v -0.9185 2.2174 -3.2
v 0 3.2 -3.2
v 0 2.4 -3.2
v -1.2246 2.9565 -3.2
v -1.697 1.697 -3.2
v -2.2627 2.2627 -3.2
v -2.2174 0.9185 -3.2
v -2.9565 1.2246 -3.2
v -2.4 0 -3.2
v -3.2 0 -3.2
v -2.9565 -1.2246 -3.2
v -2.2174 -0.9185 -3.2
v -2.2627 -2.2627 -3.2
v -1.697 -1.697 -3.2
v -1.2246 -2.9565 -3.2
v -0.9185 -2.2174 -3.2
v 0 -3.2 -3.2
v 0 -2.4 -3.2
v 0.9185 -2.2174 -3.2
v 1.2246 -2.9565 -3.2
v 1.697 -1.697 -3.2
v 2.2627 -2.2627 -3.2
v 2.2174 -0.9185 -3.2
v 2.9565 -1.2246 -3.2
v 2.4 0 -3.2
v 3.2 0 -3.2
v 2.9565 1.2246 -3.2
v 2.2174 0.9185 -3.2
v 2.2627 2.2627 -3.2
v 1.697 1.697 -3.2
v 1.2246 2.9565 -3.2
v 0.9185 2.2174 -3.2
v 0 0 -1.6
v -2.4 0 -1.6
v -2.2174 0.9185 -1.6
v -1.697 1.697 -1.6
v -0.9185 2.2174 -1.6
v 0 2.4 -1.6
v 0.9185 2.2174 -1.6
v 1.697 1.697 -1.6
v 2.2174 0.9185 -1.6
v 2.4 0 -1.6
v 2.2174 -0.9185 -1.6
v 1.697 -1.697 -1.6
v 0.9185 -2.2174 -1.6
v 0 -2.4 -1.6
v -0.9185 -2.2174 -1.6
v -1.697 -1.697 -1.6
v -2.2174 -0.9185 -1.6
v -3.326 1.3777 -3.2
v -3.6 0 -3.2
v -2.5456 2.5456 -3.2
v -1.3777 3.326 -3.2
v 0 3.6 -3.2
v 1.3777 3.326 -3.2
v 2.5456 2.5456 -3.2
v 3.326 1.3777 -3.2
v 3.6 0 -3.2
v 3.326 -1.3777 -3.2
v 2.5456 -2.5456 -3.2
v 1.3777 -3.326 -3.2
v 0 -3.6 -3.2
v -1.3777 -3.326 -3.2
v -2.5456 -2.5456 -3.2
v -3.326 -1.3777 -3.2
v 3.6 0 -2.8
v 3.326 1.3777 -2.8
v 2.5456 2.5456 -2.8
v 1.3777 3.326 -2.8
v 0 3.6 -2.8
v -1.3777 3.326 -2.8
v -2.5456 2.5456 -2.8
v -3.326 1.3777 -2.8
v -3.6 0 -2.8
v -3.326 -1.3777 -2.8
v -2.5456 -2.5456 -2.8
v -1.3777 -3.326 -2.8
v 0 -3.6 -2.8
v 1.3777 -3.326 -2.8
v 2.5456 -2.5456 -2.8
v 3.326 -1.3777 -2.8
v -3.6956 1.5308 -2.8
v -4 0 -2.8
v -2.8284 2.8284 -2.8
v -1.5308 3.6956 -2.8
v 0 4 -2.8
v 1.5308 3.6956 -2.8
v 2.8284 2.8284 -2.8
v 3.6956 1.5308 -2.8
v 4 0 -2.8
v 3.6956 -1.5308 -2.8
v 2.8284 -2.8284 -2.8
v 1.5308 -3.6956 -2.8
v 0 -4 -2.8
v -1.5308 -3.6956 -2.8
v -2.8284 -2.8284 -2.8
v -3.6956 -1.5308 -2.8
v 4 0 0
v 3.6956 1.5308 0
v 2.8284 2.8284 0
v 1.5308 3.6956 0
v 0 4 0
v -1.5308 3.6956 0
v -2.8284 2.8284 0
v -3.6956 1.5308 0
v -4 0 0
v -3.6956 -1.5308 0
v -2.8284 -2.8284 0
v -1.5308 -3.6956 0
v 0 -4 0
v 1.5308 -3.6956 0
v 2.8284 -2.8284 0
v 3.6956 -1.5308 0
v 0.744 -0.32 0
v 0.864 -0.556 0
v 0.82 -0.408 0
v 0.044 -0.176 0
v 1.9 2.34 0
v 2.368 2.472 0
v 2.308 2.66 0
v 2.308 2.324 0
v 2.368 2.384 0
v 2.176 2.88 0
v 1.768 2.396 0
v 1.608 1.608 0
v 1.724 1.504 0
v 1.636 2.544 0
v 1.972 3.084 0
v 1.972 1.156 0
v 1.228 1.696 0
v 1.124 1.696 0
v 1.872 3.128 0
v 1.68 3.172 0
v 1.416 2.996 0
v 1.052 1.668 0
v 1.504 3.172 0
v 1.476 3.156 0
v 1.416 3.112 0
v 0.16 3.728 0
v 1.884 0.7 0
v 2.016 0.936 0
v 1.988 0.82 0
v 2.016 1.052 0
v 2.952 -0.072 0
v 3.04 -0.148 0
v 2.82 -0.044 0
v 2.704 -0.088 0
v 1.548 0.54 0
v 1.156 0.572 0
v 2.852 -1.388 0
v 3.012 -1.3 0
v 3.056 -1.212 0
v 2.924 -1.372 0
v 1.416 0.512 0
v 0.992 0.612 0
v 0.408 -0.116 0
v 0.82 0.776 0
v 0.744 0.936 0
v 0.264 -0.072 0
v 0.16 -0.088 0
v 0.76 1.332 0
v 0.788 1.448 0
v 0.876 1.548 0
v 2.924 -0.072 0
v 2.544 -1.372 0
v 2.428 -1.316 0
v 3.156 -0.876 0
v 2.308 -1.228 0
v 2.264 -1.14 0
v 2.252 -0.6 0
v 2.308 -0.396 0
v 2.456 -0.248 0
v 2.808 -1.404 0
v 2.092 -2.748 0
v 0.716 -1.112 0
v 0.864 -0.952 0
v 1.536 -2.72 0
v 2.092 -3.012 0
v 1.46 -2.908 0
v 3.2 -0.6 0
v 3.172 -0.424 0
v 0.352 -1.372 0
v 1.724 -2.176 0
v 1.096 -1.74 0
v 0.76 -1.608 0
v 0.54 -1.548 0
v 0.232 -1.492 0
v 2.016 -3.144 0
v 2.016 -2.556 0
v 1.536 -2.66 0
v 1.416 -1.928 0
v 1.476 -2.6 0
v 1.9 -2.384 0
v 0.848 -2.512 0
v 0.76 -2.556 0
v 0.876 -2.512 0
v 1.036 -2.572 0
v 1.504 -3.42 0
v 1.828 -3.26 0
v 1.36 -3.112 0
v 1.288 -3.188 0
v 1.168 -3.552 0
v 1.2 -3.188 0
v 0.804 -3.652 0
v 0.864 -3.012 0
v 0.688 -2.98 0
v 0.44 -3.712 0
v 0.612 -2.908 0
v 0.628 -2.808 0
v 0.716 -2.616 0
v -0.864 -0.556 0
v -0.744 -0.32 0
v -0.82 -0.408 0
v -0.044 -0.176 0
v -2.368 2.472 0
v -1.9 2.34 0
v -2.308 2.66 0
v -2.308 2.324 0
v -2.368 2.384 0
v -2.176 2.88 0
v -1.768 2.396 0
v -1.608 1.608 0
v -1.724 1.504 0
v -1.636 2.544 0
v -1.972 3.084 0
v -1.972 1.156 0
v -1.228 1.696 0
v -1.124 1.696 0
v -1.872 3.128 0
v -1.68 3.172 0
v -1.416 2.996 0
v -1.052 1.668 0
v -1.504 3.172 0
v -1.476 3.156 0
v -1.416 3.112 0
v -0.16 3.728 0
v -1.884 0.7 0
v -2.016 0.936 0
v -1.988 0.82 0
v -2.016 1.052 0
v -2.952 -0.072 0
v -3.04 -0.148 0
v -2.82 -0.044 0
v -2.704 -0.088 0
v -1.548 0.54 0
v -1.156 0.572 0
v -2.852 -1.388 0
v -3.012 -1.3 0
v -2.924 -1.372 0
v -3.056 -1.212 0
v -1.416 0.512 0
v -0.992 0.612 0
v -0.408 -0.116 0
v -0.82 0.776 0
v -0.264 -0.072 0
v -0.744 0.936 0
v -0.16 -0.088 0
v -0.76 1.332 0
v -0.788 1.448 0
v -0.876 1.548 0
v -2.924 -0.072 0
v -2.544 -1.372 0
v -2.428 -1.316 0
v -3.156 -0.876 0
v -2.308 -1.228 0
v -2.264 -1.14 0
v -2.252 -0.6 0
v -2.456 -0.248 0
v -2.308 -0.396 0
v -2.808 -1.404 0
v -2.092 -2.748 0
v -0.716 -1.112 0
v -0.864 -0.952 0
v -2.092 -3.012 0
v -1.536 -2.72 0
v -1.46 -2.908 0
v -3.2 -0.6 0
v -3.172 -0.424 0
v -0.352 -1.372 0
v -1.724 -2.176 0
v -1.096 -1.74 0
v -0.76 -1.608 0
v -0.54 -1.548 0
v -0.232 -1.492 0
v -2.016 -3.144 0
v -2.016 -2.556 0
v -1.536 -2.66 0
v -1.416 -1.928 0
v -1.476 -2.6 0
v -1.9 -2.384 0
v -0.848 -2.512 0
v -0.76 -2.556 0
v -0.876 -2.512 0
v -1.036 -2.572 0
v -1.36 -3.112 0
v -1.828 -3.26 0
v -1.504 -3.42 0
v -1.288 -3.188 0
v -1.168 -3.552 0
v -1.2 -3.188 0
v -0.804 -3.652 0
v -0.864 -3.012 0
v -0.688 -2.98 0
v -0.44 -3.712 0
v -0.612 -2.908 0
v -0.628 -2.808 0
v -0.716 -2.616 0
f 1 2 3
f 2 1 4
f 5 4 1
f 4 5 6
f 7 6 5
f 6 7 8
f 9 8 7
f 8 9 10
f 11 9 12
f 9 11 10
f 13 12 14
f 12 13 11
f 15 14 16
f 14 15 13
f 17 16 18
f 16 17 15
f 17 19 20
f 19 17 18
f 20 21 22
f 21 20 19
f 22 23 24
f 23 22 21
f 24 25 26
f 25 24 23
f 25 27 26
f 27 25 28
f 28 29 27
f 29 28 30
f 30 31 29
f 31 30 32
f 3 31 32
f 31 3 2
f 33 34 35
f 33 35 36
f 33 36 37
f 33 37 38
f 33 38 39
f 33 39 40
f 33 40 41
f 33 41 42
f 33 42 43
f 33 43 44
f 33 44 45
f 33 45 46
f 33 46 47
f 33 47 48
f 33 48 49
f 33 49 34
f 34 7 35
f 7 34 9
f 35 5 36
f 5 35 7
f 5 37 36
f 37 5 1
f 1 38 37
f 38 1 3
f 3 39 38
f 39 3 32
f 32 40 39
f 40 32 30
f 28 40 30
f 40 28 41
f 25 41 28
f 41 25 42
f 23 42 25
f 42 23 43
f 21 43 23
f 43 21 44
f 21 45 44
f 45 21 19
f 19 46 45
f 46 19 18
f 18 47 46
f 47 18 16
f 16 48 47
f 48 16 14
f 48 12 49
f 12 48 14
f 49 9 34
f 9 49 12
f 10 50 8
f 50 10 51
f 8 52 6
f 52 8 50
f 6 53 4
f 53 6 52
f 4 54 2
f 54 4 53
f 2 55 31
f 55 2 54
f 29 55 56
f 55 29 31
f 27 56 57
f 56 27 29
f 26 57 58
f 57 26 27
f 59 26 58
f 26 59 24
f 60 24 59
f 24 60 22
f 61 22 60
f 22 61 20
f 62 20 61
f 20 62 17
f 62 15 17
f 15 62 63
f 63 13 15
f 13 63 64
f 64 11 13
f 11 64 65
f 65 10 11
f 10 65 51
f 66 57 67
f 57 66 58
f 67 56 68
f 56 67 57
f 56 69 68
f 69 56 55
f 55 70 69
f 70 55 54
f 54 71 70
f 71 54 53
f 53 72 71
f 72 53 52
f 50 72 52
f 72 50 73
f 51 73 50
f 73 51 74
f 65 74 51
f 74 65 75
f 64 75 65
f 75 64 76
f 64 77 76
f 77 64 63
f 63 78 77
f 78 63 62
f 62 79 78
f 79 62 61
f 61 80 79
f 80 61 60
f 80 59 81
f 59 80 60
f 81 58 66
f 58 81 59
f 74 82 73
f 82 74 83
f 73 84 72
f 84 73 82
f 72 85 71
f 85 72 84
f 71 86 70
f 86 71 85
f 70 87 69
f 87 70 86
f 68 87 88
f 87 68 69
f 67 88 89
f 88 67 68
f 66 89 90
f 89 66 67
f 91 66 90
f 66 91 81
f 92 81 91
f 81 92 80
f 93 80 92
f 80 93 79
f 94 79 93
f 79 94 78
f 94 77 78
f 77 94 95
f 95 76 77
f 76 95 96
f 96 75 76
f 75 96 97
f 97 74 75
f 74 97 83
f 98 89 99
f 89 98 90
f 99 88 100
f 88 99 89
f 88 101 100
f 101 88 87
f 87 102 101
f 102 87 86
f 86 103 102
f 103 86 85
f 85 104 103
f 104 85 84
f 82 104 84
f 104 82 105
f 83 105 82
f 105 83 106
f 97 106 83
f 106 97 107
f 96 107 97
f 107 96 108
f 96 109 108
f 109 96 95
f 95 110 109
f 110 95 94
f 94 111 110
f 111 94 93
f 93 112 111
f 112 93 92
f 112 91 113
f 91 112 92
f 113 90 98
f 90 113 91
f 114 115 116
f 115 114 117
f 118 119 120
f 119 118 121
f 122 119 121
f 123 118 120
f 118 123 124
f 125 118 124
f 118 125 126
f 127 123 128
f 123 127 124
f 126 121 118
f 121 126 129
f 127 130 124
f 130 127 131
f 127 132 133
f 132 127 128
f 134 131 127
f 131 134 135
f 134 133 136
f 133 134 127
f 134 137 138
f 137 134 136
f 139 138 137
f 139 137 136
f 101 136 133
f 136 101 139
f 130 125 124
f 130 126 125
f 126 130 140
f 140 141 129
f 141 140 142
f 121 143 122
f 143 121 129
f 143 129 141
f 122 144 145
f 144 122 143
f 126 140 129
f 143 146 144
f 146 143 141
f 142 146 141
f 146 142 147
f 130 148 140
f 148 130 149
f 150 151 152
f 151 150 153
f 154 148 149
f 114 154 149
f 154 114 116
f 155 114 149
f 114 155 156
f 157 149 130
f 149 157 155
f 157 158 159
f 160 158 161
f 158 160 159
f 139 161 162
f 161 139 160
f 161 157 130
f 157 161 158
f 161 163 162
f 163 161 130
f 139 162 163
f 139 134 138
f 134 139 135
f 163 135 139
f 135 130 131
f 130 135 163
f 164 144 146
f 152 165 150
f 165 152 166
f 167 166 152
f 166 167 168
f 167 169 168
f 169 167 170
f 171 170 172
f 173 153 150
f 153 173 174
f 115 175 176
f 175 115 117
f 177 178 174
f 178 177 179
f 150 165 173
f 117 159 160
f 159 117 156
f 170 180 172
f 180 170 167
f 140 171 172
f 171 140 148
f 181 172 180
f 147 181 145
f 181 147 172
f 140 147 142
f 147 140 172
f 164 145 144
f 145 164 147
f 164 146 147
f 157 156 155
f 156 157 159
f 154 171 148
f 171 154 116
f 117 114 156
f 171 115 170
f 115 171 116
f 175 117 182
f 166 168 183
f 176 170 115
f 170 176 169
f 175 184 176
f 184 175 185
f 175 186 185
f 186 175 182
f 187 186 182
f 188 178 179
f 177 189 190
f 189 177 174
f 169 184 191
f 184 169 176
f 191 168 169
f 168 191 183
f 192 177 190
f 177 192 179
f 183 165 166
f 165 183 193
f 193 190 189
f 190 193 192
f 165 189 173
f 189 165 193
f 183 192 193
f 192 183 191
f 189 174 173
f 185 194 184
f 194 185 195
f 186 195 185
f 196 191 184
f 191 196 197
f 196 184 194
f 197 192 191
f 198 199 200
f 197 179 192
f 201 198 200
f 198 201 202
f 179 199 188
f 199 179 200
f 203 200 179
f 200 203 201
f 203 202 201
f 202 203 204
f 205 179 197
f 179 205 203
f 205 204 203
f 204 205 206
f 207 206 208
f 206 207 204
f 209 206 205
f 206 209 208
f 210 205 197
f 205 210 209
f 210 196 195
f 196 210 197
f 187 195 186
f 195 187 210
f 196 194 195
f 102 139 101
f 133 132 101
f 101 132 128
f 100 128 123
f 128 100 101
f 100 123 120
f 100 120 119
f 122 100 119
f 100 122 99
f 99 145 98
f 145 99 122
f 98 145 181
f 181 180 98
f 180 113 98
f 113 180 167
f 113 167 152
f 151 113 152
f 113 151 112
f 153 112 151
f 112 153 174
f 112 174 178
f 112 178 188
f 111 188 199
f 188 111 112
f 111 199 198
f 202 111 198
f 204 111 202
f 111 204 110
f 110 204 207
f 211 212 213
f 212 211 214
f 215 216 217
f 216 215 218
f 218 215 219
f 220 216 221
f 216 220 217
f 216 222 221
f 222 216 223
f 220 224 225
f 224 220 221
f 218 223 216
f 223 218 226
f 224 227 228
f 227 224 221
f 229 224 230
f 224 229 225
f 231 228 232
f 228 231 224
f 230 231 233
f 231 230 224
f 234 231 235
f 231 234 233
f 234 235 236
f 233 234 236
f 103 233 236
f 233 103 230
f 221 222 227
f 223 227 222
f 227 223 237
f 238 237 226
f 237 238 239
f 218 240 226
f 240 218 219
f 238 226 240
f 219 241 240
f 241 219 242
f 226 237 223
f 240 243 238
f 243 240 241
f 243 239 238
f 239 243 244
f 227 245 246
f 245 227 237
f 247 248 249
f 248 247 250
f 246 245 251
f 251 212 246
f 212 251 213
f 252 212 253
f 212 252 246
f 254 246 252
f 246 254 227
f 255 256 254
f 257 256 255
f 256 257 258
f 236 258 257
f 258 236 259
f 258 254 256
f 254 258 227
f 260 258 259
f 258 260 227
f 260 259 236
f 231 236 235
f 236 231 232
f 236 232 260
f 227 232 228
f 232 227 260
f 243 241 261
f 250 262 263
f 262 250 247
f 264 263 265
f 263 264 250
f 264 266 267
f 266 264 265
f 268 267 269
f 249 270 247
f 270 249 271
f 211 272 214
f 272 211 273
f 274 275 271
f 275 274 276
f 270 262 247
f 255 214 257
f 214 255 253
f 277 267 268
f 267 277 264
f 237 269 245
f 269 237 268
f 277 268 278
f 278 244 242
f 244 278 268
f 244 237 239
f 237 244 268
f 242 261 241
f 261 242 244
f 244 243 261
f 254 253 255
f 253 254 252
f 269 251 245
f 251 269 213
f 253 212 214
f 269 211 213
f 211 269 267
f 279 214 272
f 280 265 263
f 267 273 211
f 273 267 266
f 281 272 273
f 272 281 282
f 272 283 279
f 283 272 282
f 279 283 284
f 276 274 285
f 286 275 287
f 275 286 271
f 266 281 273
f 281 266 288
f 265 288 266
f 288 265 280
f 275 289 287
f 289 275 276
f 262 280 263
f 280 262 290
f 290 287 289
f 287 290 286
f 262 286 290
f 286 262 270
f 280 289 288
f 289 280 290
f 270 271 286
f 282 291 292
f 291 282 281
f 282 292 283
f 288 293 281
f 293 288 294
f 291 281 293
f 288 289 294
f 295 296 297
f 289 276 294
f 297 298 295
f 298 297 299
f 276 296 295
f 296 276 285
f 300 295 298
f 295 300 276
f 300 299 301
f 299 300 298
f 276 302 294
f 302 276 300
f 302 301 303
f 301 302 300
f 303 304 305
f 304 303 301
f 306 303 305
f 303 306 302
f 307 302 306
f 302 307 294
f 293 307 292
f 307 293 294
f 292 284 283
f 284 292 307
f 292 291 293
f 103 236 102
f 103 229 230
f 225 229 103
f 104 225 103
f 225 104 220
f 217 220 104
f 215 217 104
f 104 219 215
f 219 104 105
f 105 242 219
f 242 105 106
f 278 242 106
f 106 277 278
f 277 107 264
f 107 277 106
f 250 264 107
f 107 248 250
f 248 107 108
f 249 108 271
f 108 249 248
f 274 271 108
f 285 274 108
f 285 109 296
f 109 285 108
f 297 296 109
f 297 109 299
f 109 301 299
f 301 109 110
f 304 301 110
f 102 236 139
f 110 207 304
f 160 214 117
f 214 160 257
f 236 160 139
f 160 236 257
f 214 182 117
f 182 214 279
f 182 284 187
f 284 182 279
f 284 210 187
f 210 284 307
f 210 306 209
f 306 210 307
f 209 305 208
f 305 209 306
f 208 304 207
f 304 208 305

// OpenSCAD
// file: ../p/4-4disc.scad
use <../lib.scad>
function ldraw_lib__4_4disc() = [
// 0 Disc 1.0
// 0 Name: 4-4disc.dat
// 0 Author: James Jessiman
// 0 !LDRAW_ORG Primitive UPDATE 2002-02
// 0 !LICENSE Licensed under CC BY 4.0 : see CAreadme.txt
// 
// 0 BFC CERTIFY CCW
  [0,"BFC","CERTIFY"],
  [0,"BFC","CCW"],
// 
// 0 !HISTORY 1998-12-15 [PTadmin] Official Update 1998-10
// 0 !HISTORY 2002-03-23 [sbliss] Added BFC statement
// 0 !HISTORY 2002-04-25 [PTadmin] Official Update 2002-02
// 0 !HISTORY 2007-06-24 [PTadmin] Header formatted for Contributor Agreement
// 0 !HISTORY 2008-07-01 [PTadmin] Official Update 2008-01
// 
// 
// 3 16 0 0 0 1 0 0 0.9239 0 0.3827
  [3,16,0,0,0,1,0,0,0.9239,0,0.3827],
// 3 16 0 0 0 0.9239 0 0.3827 0.7071 0 0.7071
  [3,16,0,0,0,0.9239,0,0.3827,0.7071,0,0.7071],
// 3 16 0 0 0 0.7071 0 0.7071 0.3827 0 0.9239
  [3,16,0,0,0,0.7071,0,0.7071,0.3827,0,0.9239],
// 3 16 0 0 0 0.3827 0 0.9239 0 0 1
  [3,16,0,0,0,0.3827,0,0.9239,0,0,1],
// 3 16 0 0 0 0 0 1 -0.3827 0 0.9239
  [3,16,0,0,0,0,0,1,-0.3827,0,0.9239],
// 3 16 0 0 0 -0.3827 0 0.9239 -0.7071 0 0.7071
  [3,16,0,0,0,-0.3827,0,0.9239,-0.7071,0,0.7071],
// 3 16 0 0 0 -0.7071 0 0.7071 -0.9239 0 0.3827
  [3,16,0,0,0,-0.7071,0,0.7071,-0.9239,0,0.3827],
// 3 16 0 0 0 -0.9239 0 0.3827 -1 0 -0
  [3,16,0,0,0,-0.9239,0,0.3827,-1,0,-0],
// 3 16 0 0 0 -1 0 -0 -0.9239 0 -0.3827
  [3,16,0,0,0,-1,0,-0,-0.9239,0,-0.3827],
// 3 16 0 0 0 -0.9239 0 -0.3827 -0.7071 0 -0.7071
  [3,16,0,0,0,-0.9239,0,-0.3827,-0.7071,0,-0.7071],
// 3 16 0 0 0 -0.7071 0 -0.7071 -0.3827 0 -0.9239
  [3,16,0,0,0,-0.7071,0,-0.7071,-0.3827,0,-0.9239],
// 3 16 0 0 0 -0.3827 0 -0.9239 0 0 -1
  [3,16,0,0,0,-0.3827,0,-0.9239,0,0,-1],
// 3 16 0 0 0 0 0 -1 0.3827 0 -0.9239
  [3,16,0,0,0,0,0,-1,0.3827,0,-0.9239],
// 3 16 0 0 0 0.3827 0 -0.9239 0.7071 0 -0.7071
  [3,16,0,0,0,0.3827,0,-0.9239,0.7071,0,-0.7071],
// 3 16 0 0 0 0.7071 0 -0.7071 0.9239 0 -0.3827
  [3,16,0,0,0,0.7071,0,-0.7071,0.9239,0,-0.3827],
// 3 16 0 0 0 0.9239 0 -0.3827 1 0 0
  [3,16,0,0,0,0.9239,0,-0.3827,1,0,0],
// 0
];
module ldraw_lib__4_4disc(step=0, col=false, unit=2/5, alt=false, line=0.2, solid=!$preview)
    makepoly(ldraw_lib__4_4disc(), step=step, col=col, unit=unit, alt=alt, line=line, solid=solid);
ldraw_lib__4_4disc(line=0.2);
// file: ../p/4-4ring3.scad
use <../lib.scad>
function ldraw_lib__4_4ring3() = [
// 0 Ring  3 x 1.0
// 0 Name: 4-4ring3.dat
// 0 Author: James Jessiman
// 0 !LDRAW_ORG Primitive UPDATE 2009-01
// 0 !LICENSE Licensed under CC BY 4.0 : see CAreadme.txt
// 
// 0 BFC CERTIFY CCW
  [0,"BFC","CERTIFY"],
  [0,"BFC","CCW"],
// 
// 0 !HISTORY 1998-12-15 [PTadmin] Official Update 1998-10
// 0 !HISTORY 2002-04-05 [hafhead] Added BFC statement
// 0 !HISTORY 2002-04-25 [PTadmin] Official Update 2002-02
// 0 !HISTORY 2007-06-24 [PTadmin] Header formatted for Contributor Agreement
// 0 !HISTORY 2008-07-01 [PTadmin] Official Update 2008-01
// 0 !HISTORY 2008-08-26 [cwdee] Switch polygon winding and rename
// 0 !HISTORY 2009-05-02 [PTadmin] Official Update 2009-01
// 
// 
// 4 16 -1.5308 0 3.6956 -1.1481 0 2.7717 0 0 3 0 0 4
  [4,16,-1.5308,0,3.6956,-1.1481,0,2.7717,0,0,3,0,0,4],
// 4 16 -2.8284 0 2.8284 -2.1213 0 2.1213 -1.1481 0 2.7717 -1.5308 0 3.6956
  [4,16,-2.8284,0,2.8284,-2.1213,0,2.1213,-1.1481,0,2.7717,-1.5308,0,3.6956],
// 4 16 -3.6956 0 1.5308 -2.7717 0 1.1481 -2.1213 0 2.1213 -2.8284 0 2.8284
  [4,16,-3.6956,0,1.5308,-2.7717,0,1.1481,-2.1213,0,2.1213,-2.8284,0,2.8284],
// 4 16 -4 0 0 -3 0 0 -2.7717 0 1.1481 -3.6956 0 1.5308
  [4,16,-4,0,0,-3,0,0,-2.7717,0,1.1481,-3.6956,0,1.5308],
// 4 16 -3.6956 0 -1.5308 -2.7717 0 -1.1481 -3 0 0 -4 0 0
  [4,16,-3.6956,0,-1.5308,-2.7717,0,-1.1481,-3,0,0,-4,0,0],
// 4 16 -2.8284 0 -2.8284 -2.1213 0 -2.1213 -2.7717 0 -1.1481 -3.6956 0 -1.5308
  [4,16,-2.8284,0,-2.8284,-2.1213,0,-2.1213,-2.7717,0,-1.1481,-3.6956,0,-1.5308],
// 4 16 -1.5308 0 -3.6956 -1.1481 0 -2.7717 -2.1213 0 -2.1213 -2.8284 0 -2.8284
  [4,16,-1.5308,0,-3.6956,-1.1481,0,-2.7717,-2.1213,0,-2.1213,-2.8284,0,-2.8284],
// 4 16 0 0 -4 0 0 -3 -1.1481 0 -2.7717 -1.5308 0 -3.6956
  [4,16,0,0,-4,0,0,-3,-1.1481,0,-2.7717,-1.5308,0,-3.6956],
// 4 16 1.5308 0 -3.6956 1.1481 0 -2.7717 0 0 -3 0 0 -4
  [4,16,1.5308,0,-3.6956,1.1481,0,-2.7717,0,0,-3,0,0,-4],
// 4 16 2.8284 0 -2.8284 2.1213 0 -2.1213 1.1481 0 -2.7717 1.5308 0 -3.6956
  [4,16,2.8284,0,-2.8284,2.1213,0,-2.1213,1.1481,0,-2.7717,1.5308,0,-3.6956],
// 4 16 3.6956 0 -1.5308 2.7717 0 -1.1481 2.1213 0 -2.1213 2.8284 0 -2.8284
  [4,16,3.6956,0,-1.5308,2.7717,0,-1.1481,2.1213,0,-2.1213,2.8284,0,-2.8284],
// 4 16 4 0 0 3 0 0 2.7717 0 -1.1481 3.6956 0 -1.5308
  [4,16,4,0,0,3,0,0,2.7717,0,-1.1481,3.6956,0,-1.5308],
// 4 16 3.6956 0 1.5308 2.7717 0 1.1481 3 0 0 4 0 0
  [4,16,3.6956,0,1.5308,2.7717,0,1.1481,3,0,0,4,0,0],
// 4 16 2.8284 0 2.8284 2.1213 0 2.1213 2.7717 0 1.1481 3.6956 0 1.5308
  [4,16,2.8284,0,2.8284,2.1213,0,2.1213,2.7717,0,1.1481,3.6956,0,1.5308],
// 4 16 1.5308 0 3.6956 1.1481 0 2.7717 2.1213 0 2.1213 2.8284 0 2.8284
  [4,16,1.5308,0,3.6956,1.1481,0,2.7717,2.1213,0,2.1213,2.8284,0,2.8284],
// 4 16 0 0 4 0 0 3 1.1481 0 2.7717 1.5308 0 3.6956
  [4,16,0,0,4,0,0,3,1.1481,0,2.7717,1.5308,0,3.6956],
// 0
];
module ldraw_lib__4_4ring3(step=0, col=false, unit=2/5, alt=false, line=0.2, solid=!$preview)
    makepoly(ldraw_lib__4_4ring3(), step=step, col=col, unit=unit, alt=alt, line=line, solid=solid);
ldraw_lib__4_4ring3(line=0.2);
// file: ../p/4-4cylc.scad
use <../lib.scad>
use <4-4cyli.scad>
use <4-4disc.scad>
use <4-4edge.scad>
function ldraw_lib__4_4cylc() = [
// 0 Cylinder Closed 1.0
// 0 Name: 4-4cylc.dat
// 0 Author: Alex Taylor [anathema]
// 0 !LDRAW_ORG Primitive UPDATE 2009-02
// 0 !LICENSE Licensed under CC BY 4.0 : see CAreadme.txt
// 
// 0 BFC CERTIFY CCW
  [0,"BFC","CERTIFY"],
  [0,"BFC","CCW"],
// 
// 0 !HISTORY 2008-12-29 [cwdee] Removed one disc
// 0 !HISTORY 2009-09-03 [PTadmin] Official Update 2009-02
// 
// 
// 1 16 0 0 0 1 0 0 0 1 0 0 0 1 4-4edge.dat
  [1,16,0,0,0,1,0,0,0,1,0,0,0,1, ldraw_lib__4_4edge()],
// 1 16 0 1 0 1 0 0 0 1 0 0 0 1 4-4edge.dat
  [1,16,0,1,0,1,0,0,0,1,0,0,0,1, ldraw_lib__4_4edge()],
// 1 16 0 0 0 1 0 0 0 1 0 0 0 1 4-4disc.dat
  [1,16,0,0,0,1,0,0,0,1,0,0,0,1, ldraw_lib__4_4disc()],
// 1 16 0 0 0 1 0 0 0 1 0 0 0 1 4-4cyli.dat
  [1,16,0,0,0,1,0,0,0,1,0,0,0,1, ldraw_lib__4_4cyli()],
// 0
];
module ldraw_lib__4_4cylc(step=0, col=false, unit=2/5, alt=false, line=0.2, solid=!$preview)
    makepoly(ldraw_lib__4_4cylc(), step=step, col=col, unit=unit, alt=alt, line=line, solid=solid);
ldraw_lib__4_4cylc(line=0.2);
// file: ../p/4-4edge.scad
use <../lib.scad>
function ldraw_lib__4_4edge() = [
// 0 Circle 1.0
// 0 Name: 4-4edge.dat
// 0 Author: James Jessiman
// 0 !LDRAW_ORG Primitive UPDATE 2017-01
// 0 !LICENSE Licensed under CC BY 4.0 : see CAreadme.txt
// 
// 0 BFC CERTIFY CCW
  [0,"BFC","CERTIFY"],
  [0,"BFC","CCW"],
// 
// 0 !HISTORY 1998-12-15 [PTadmin] Official Update 1998-10
// 0 !HISTORY 2005-12-28 [PTadmin] Official Update 2005-01
// 0 !HISTORY 2007-06-24 [PTadmin] Header formatted for Contributor Agreement
// 0 !HISTORY 2008-07-01 [PTadmin] Official Update 2008-01
// 0 !HISTORY 2017-01-15 [Steffen] BFCed
// 0 !HISTORY 2017-12-30 [PTadmin] Official Update 2017-01
// 
// 
// 2 24 1 0 0 0.9239 0 0.3827
  [2,24,1,0,0,0.9239,0,0.3827],
// 2 24 0.9239 0 0.3827 0.7071 0 0.7071
  [2,24,0.9239,0,0.3827,0.7071,0,0.7071],
// 2 24 0.7071 0 0.7071 0.3827 0 0.9239
  [2,24,0.7071,0,0.7071,0.3827,0,0.9239],
// 2 24 0.3827 0 0.9239 0 0 1
  [2,24,0.3827,0,0.9239,0,0,1],
// 2 24 0 0 1 -0.3827 0 0.9239
  [2,24,0,0,1,-0.3827,0,0.9239],
// 2 24 -0.3827 0 0.9239 -0.7071 0 0.7071
  [2,24,-0.3827,0,0.9239,-0.7071,0,0.7071],
// 2 24 -0.7071 0 0.7071 -0.9239 0 0.3827
  [2,24,-0.7071,0,0.7071,-0.9239,0,0.3827],
// 2 24 -0.9239 0 0.3827 -1 0 -0
  [2,24,-0.9239,0,0.3827,-1,0,-0],
// 2 24 -1 0 -0 -0.9239 0 -0.3827
  [2,24,-1,0,-0,-0.9239,0,-0.3827],
// 2 24 -0.9239 0 -0.3827 -0.7071 0 -0.7071
  [2,24,-0.9239,0,-0.3827,-0.7071,0,-0.7071],
// 2 24 -0.7071 0 -0.7071 -0.3827 0 -0.9239
  [2,24,-0.7071,0,-0.7071,-0.3827,0,-0.9239],
// 2 24 -0.3827 0 -0.9239 0 0 -1
  [2,24,-0.3827,0,-0.9239,0,0,-1],
// 2 24 0 0 -1 0.3827 0 -0.9239
  [2,24,0,0,-1,0.3827,0,-0.9239],
// 2 24 0.3827 0 -0.9239 0.7071 0 -0.7071
  [2,24,0.3827,0,-0.9239,0.7071,0,-0.7071],
// 2 24 0.7071 0 -0.7071 0.9239 0 -0.3827
  [2,24,0.7071,0,-0.7071,0.9239,0,-0.3827],
// 2 24 0.9239 0 -0.3827 1 0 0
  [2,24,0.9239,0,-0.3827,1,0,0],
];
module ldraw_lib__4_4edge(step=0, col=false, unit=2/5, alt=false, line=0.2, solid=!$preview)
    makepoly(ldraw_lib__4_4edge(), step=step, col=col, unit=unit, alt=alt, line=line, solid=solid);
ldraw_lib__4_4edge(line=0.2);
// file: ../p/4-4cyli.scad
use <../lib.scad>
function ldraw_lib__4_4cyli() = [
// 0 Cylinder 1.0
// 0 Name: 4-4cyli.dat
// 0 Author: James Jessiman
// 0 !LDRAW_ORG Primitive UPDATE 2005-01
// 0 !LICENSE Licensed under CC BY 4.0 : see CAreadme.txt
// 
// 0 BFC CERTIFY CCW
  [0,"BFC","CERTIFY"],
  [0,"BFC","CCW"],
// 
// 0 !HISTORY 1998-12-15 [PTadmin] Official Update 1998-10
// 0 !HISTORY 2002-03-23 [sbliss] Added BFC statement; merged headers from files in distributions LDraw 0.27 and Complete.
// 0 !HISTORY 2002-04-25 [PTadmin] Official Update 2002-02
// 0 !HISTORY 2004-12-14 [guyvivan] BFC CCW
// 0 !HISTORY 2005-12-28 [PTadmin] Official Update 2005-01
// 0 !HISTORY 2007-06-24 [PTadmin] Header formatted for Contributor Agreement
// 0 !HISTORY 2008-07-01 [PTadmin] Official Update 2008-01
// 
// 
// 4 16 1 1 0 0.9239 1 0.3827 0.9239 0 0.3827 1 0 0
  [4,16,1,1,0,0.9239,1,0.3827,0.9239,0,0.3827,1,0,0],
// 5 24 1 0 0 1 1 0 0.9239 0 0.3827 0.9239 0 -0.3827
  [5,24,1,0,0,1,1,0,0.9239,0,0.3827,0.9239,0,-0.3827],
// 4 16 0.9239 1 0.3827 0.7071 1 0.7071 0.7071 0 0.7071 0.9239 0 0.3827
  [4,16,0.9239,1,0.3827,0.7071,1,0.7071,0.7071,0,0.7071,0.9239,0,0.3827],
// 5 24 0.9239 0 0.3827 0.9239 1 0.3827 0.7071 0 0.7071 1 0 0
  [5,24,0.9239,0,0.3827,0.9239,1,0.3827,0.7071,0,0.7071,1,0,0],
// 4 16 0.7071 1 0.7071 0.3827 1 0.9239 0.3827 0 0.9239 0.7071 0 0.7071
  [4,16,0.7071,1,0.7071,0.3827,1,0.9239,0.3827,0,0.9239,0.7071,0,0.7071],
// 5 24 0.7071 0 0.7071 0.7071 1 0.7071 0.3827 0 0.9239 0.9239 0 0.3827
  [5,24,0.7071,0,0.7071,0.7071,1,0.7071,0.3827,0,0.9239,0.9239,0,0.3827],
// 4 16 0.3827 1 0.9239 0 1 1 0 0 1 0.3827 0 0.9239
  [4,16,0.3827,1,0.9239,0,1,1,0,0,1,0.3827,0,0.9239],
// 5 24 0.3827 0 0.9239 0.3827 1 0.9239 0 0 1 0.7071 0 0.7071
  [5,24,0.3827,0,0.9239,0.3827,1,0.9239,0,0,1,0.7071,0,0.7071],
// 4 16 0 1 1 -0.3827 1 0.9239 -0.3827 0 0.9239 0 0 1
  [4,16,0,1,1,-0.3827,1,0.9239,-0.3827,0,0.9239,0,0,1],
// 5 24 0 0 1 0 1 1 -0.3827 0 0.9239 0.3827 0 0.9239
  [5,24,0,0,1,0,1,1,-0.3827,0,0.9239,0.3827,0,0.9239],
// 4 16 -0.3827 1 0.9239 -0.7071 1 0.7071 -0.7071 0 0.7071 -0.3827 0 0.9239
  [4,16,-0.3827,1,0.9239,-0.7071,1,0.7071,-0.7071,0,0.7071,-0.3827,0,0.9239],
// 5 24 -0.3827 0 0.9239 -0.3827 1 0.9239 -0.7071 0 0.7071 0 0 1
  [5,24,-0.3827,0,0.9239,-0.3827,1,0.9239,-0.7071,0,0.7071,0,0,1],
// 4 16 -0.7071 1 0.7071 -0.9239 1 0.3827 -0.9239 0 0.3827 -0.7071 0 0.7071
  [4,16,-0.7071,1,0.7071,-0.9239,1,0.3827,-0.9239,0,0.3827,-0.7071,0,0.7071],
// 5 24 -0.7071 0 0.7071 -0.7071 1 0.7071 -0.9239 0 0.3827 -0.3827 0 0.9239
  [5,24,-0.7071,0,0.7071,-0.7071,1,0.7071,-0.9239,0,0.3827,-0.3827,0,0.9239],
// 4 16 -0.9239 1 0.3827 -1 1 0 -1 0 0 -0.9239 0 0.3827
  [4,16,-0.9239,1,0.3827,-1,1,0,-1,0,0,-0.9239,0,0.3827],
// 5 24 -0.9239 0 0.3827 -0.9239 1 0.3827 -1 0 0 -0.7071 0 0.7071
  [5,24,-0.9239,0,0.3827,-0.9239,1,0.3827,-1,0,0,-0.7071,0,0.7071],
// 4 16 -1 1 0 -0.9239 1 -0.3827 -0.9239 0 -0.3827 -1 0 0
  [4,16,-1,1,0,-0.9239,1,-0.3827,-0.9239,0,-0.3827,-1,0,0],
// 5 24 -1 0 0 -1 1 0 -0.9239 0 -0.3827 -0.9239 0 0.3827
  [5,24,-1,0,0,-1,1,0,-0.9239,0,-0.3827,-0.9239,0,0.3827],
// 4 16 -0.9239 1 -0.3827 -0.7071 1 -0.7071 -0.7071 0 -0.7071 -0.9239 0 -0.3827
  [4,16,-0.9239,1,-0.3827,-0.7071,1,-0.7071,-0.7071,0,-0.7071,-0.9239,0,-0.3827],
// 5 24 -0.9239 0 -0.3827 -0.9239 1 -0.3827 -0.7071 0 -0.7071 -1 0 0
  [5,24,-0.9239,0,-0.3827,-0.9239,1,-0.3827,-0.7071,0,-0.7071,-1,0,0],
// 4 16 -0.7071 1 -0.7071 -0.3827 1 -0.9239 -0.3827 0 -0.9239 -0.7071 0 -0.7071
  [4,16,-0.7071,1,-0.7071,-0.3827,1,-0.9239,-0.3827,0,-0.9239,-0.7071,0,-0.7071],
// 5 24 -0.7071 0 -0.7071 -0.7071 1 -0.7071 -0.3827 0 -0.9239 -0.9239 0 -0.3827
  [5,24,-0.7071,0,-0.7071,-0.7071,1,-0.7071,-0.3827,0,-0.9239,-0.9239,0,-0.3827],
// 4 16 -0.3827 1 -0.9239 0 1 -1 0 0 -1 -0.3827 0 -0.9239
  [4,16,-0.3827,1,-0.9239,0,1,-1,0,0,-1,-0.3827,0,-0.9239],
// 5 24 -0.3827 0 -0.9239 -0.3827 1 -0.9239 0 0 -1 -0.7071 0 -0.7071
  [5,24,-0.3827,0,-0.9239,-0.3827,1,-0.9239,0,0,-1,-0.7071,0,-0.7071],
// 4 16 0 1 -1 0.3827 1 -0.9239 0.3827 0 -0.9239 0 0 -1
  [4,16,0,1,-1,0.3827,1,-0.9239,0.3827,0,-0.9239,0,0,-1],
// 5 24 0 0 -1 0 1 -1 0.3827 0 -0.9239 -0.3827 0 -0.9239
  [5,24,0,0,-1,0,1,-1,0.3827,0,-0.9239,-0.3827,0,-0.9239],
// 4 16 0.3827 1 -0.9239 0.7071 1 -0.7071 0.7071 0 -0.7071 0.3827 0 -0.9239
  [4,16,0.3827,1,-0.9239,0.7071,1,-0.7071,0.7071,0,-0.7071,0.3827,0,-0.9239],
// 5 24 0.3827 0 -0.9239 0.3827 1 -0.9239 0.7071 0 -0.7071 0 0 -1
  [5,24,0.3827,0,-0.9239,0.3827,1,-0.9239,0.7071,0,-0.7071,0,0,-1],
// 4 16 0.7071 1 -0.7071 0.9239 1 -0.3827 0.9239 0 -0.3827 0.7071 0 -0.7071
  [4,16,0.7071,1,-0.7071,0.9239,1,-0.3827,0.9239,0,-0.3827,0.7071,0,-0.7071],
// 5 24 0.7071 0 -0.7071 0.7071 1 -0.7071 0.9239 0 -0.3827 0.3827 0 -0.9239
  [5,24,0.7071,0,-0.7071,0.7071,1,-0.7071,0.9239,0,-0.3827,0.3827,0,-0.9239],
// 4 16 0.9239 1 -0.3827 1 1 0 1 0 0 0.9239 0 -0.3827
  [4,16,0.9239,1,-0.3827,1,1,0,1,0,0,0.9239,0,-0.3827],
// 5 24 0.9239 0 -0.3827 0.9239 1 -0.3827 1 0 0 0.7071 0 -0.7071
  [5,24,0.9239,0,-0.3827,0.9239,1,-0.3827,1,0,0,0.7071,0,-0.7071],
// 0
];
module ldraw_lib__4_4cyli(step=0, col=false, unit=2/5, alt=false, line=0.2, solid=!$preview)
    makepoly(ldraw_lib__4_4cyli(), step=step, col=col, unit=unit, alt=alt, line=line, solid=solid);
ldraw_lib__4_4cyli(line=0.2);
// file: ../p/empty.scad
use <../lib.scad>
function ldraw_lib__empty() = [
// 0 Empty
// 0 Name: empty.dat
// 0 Author: Steffen [Steffen]
// 0 !LDRAW_ORG Primitive UPDATE 2015-01
// 0 !LICENSE Licensed under CC BY 4.0 : see CAreadme.txt
// 
// 0 BFC CERTIFY CCW
  [0,"BFC","CERTIFY"],
  [0,"BFC","CCW"],
// 
// 0 !HISTORY 2015-10-11 [PTadmin] Official Update 2015-01
// 
// 
// 0 // Tool MLCad cannot handle really empty files. This file is used as a workaround.
// 0 // It exceptionally contains forbidden non-LDRAW standard syntax to satisfy MLCad until it is fixed OR a different editor has become the de-facto LDRAW standard.
// 0 // The line being used here is an "impossible" conditional line which never should be visible,
// 0 // additionally hidden by a syntax explicitly hiding it from displaying.
// 
// 0 MLCAD HIDE 5 24 0 0 0 0.0001 0 0 0.0001 -0.0001 0 0 0 0
];
module ldraw_lib__empty(step=0, col=false, unit=2/5, alt=false, line=0.2, solid=!$preview)
    makepoly(ldraw_lib__empty(), step=step, col=col, unit=unit, alt=alt, line=line, solid=solid);
ldraw_lib__empty(line=0.2);
// file: ../p/stud4o.scad
use <../lib.scad>
use <4-4cylc.scad>
use <4-4ring3.scad>
function ldraw_lib__stud4o() = [
// 0 Stud Tube Open without Outer Cylinder
// 0 Name: stud4o.dat
// 0 Author: Magnus Forsberg [MagFors]
// 0 !LDRAW_ORG Primitive UPDATE 2011-02
// 0 !LICENSE Licensed under CC BY 4.0 : see CAreadme.txt
// 
// 0 !HELP This stud is a "antistud" to be used like a underside stud,
// 0 !HELP but without the outer cylinder.
// 0 !HELP 1 47 0 0 0 1 0 0 0 1 0 0 0 1 stud4.dat
// 
// 0 BFC CERTIFY CCW
  [0,"BFC","CERTIFY"],
  [0,"BFC","CCW"],
// 
// 0 !HISTORY 2011-12-29 [PTadmin] Official Update 2011-02
// 
// 
// 1 16 0 -4 0 2 0 0 0 1 0 0 0 2 4-4ring3.dat
  [1,16,0,-4,0,2,0,0,0,1,0,0,0,2, ldraw_lib__4_4ring3()],
// 0 BFC INVERTNEXT
  [0,"BFC","INVERTNEXT"],
// 1 16 0 0 0 -6 0 0 0 -4 0 0 0 6 4-4cylc.dat
  [1,16,0,0,0,-6,0,0,0,-4,0,0,0,6, ldraw_lib__4_4cylc()],
];
module ldraw_lib__stud4o(step=0, col=false, unit=2/5, alt=false, line=0.2, solid=!$preview)
    makepoly(ldraw_lib__stud4o(), step=step, col=col, unit=unit, alt=alt, line=line, solid=solid);
ldraw_lib__stud4o(line=0.2);
// file: ../p/4-4ring9.scad
use <../lib.scad>
function ldraw_lib__4_4ring9() = [
// 0 Ring  9 x 1.0
// 0 Name: 4-4ring9.dat
// 0 Author: Magnus Forsberg [MagFors]
// 0 !LDRAW_ORG Primitive UPDATE 2024-01
// 0 !LICENSE Licensed under CC BY 4.0 : see CAreadme.txt
// 
// 0 BFC CERTIFY CCW
  [0,"BFC","CERTIFY"],
  [0,"BFC","CCW"],
// 
// 0 !HISTORY 2004-04-22 [PTadmin] Official Update 2004-02
// 0 !HISTORY 2007-06-24 [PTadmin] Header formatted for Contributor Agreement
// 0 !HISTORY 2008-07-01 [PTadmin] Official Update 2008-01
// 0 !HISTORY 2024-01-04 [MagFors] Complete regeneration, original by jriley
// 0 !HISTORY 2024-01-29 [OrionP] Official Update 2024-01
// 
// 4 16 10 0 0 9.239 0 3.827 8.3151 0 3.4443 9 0 0
  [4,16,10,0,0,9.239,0,3.827,8.3151,0,3.4443,9,0,0],
// 4 16 9.239 0 3.827 7.071 0 7.071 6.3639 0 6.3639 8.3151 0 3.4443
  [4,16,9.239,0,3.827,7.071,0,7.071,6.3639,0,6.3639,8.3151,0,3.4443],
// 4 16 7.071 0 7.071 3.827 0 9.239 3.4443 0 8.3151 6.3639 0 6.3639
  [4,16,7.071,0,7.071,3.827,0,9.239,3.4443,0,8.3151,6.3639,0,6.3639],
// 4 16 3.827 0 9.239 0 0 10 0 0 9 3.4443 0 8.3151
  [4,16,3.827,0,9.239,0,0,10,0,0,9,3.4443,0,8.3151],
// 4 16 0 0 10 -3.827 0 9.239 -3.4443 0 8.3151 0 0 9
  [4,16,0,0,10,-3.827,0,9.239,-3.4443,0,8.3151,0,0,9],
// 4 16 -3.827 0 9.239 -7.071 0 7.071 -6.3639 0 6.3639 -3.4443 0 8.3151
  [4,16,-3.827,0,9.239,-7.071,0,7.071,-6.3639,0,6.3639,-3.4443,0,8.3151],
// 4 16 -7.071 0 7.071 -9.239 0 3.827 -8.3151 0 3.4443 -6.3639 0 6.3639
  [4,16,-7.071,0,7.071,-9.239,0,3.827,-8.3151,0,3.4443,-6.3639,0,6.3639],
// 4 16 -9.239 0 3.827 -10 0 0 -9 0 0 -8.3151 0 3.4443
  [4,16,-9.239,0,3.827,-10,0,0,-9,0,0,-8.3151,0,3.4443],
// 4 16 -10 0 0 -9.239 0 -3.827 -8.3151 0 -3.4443 -9 0 0
  [4,16,-10,0,0,-9.239,0,-3.827,-8.3151,0,-3.4443,-9,0,0],
// 4 16 -9.239 0 -3.827 -7.071 0 -7.071 -6.3639 0 -6.3639 -8.3151 0 -3.4443
  [4,16,-9.239,0,-3.827,-7.071,0,-7.071,-6.3639,0,-6.3639,-8.3151,0,-3.4443],
// 4 16 -7.071 0 -7.071 -3.827 0 -9.239 -3.4443 0 -8.3151 -6.3639 0 -6.3639
  [4,16,-7.071,0,-7.071,-3.827,0,-9.239,-3.4443,0,-8.3151,-6.3639,0,-6.3639],
// 4 16 -3.827 0 -9.239 0 0 -10 0 0 -9 -3.4443 0 -8.3151
  [4,16,-3.827,0,-9.239,0,0,-10,0,0,-9,-3.4443,0,-8.3151],
// 4 16 0 0 -10 3.827 0 -9.239 3.4443 0 -8.3151 0 0 -9
  [4,16,0,0,-10,3.827,0,-9.239,3.4443,0,-8.3151,0,0,-9],
// 4 16 3.827 0 -9.239 7.071 0 -7.071 6.3639 0 -6.3639 3.4443 0 -8.3151
  [4,16,3.827,0,-9.239,7.071,0,-7.071,6.3639,0,-6.3639,3.4443,0,-8.3151],
// 4 16 7.071 0 -7.071 9.239 0 -3.827 8.3151 0 -3.4443 6.3639 0 -6.3639
  [4,16,7.071,0,-7.071,9.239,0,-3.827,8.3151,0,-3.4443,6.3639,0,-6.3639],
// 4 16 9.239 0 -3.827 10 0 0 9 0 0 8.3151 0 -3.4443
  [4,16,9.239,0,-3.827,10,0,0,9,0,0,8.3151,0,-3.4443],
// 0 // Build by LDPartEditor (PrimGen 2.X)
];
module ldraw_lib__4_4ring9(step=0, col=false, unit=2/5, alt=false, line=0.2, solid=!$preview)
    makepoly(ldraw_lib__4_4ring9(), step=step, col=col, unit=unit, alt=alt, line=line, solid=solid);
ldraw_lib__4_4ring9(line=0.2);
// file: ../p/4-4ring8.scad
use <../lib.scad>
function ldraw_lib__4_4ring8() = [
// 0 Ring  8 x 1.0
// 0 Name: 4-4ring8.dat
// 0 Author: Steffen [Steffen]
// 0 !LDRAW_ORG Primitive UPDATE 2012-01
// 0 !LICENSE Licensed under CC BY 4.0 : see CAreadme.txt
// 
// 0 BFC CERTIFY CCW
  [0,"BFC","CERTIFY"],
  [0,"BFC","CCW"],
// 
// 0 !HISTORY 2003-12-19 [PTadmin] Official Update 2003-03
// 0 !HISTORY 2007-06-24 [PTadmin] Header formatted for Contributor Agreement
// 0 !HISTORY 2008-07-01 [PTadmin] Official Update 2008-01
// 0 !HISTORY 2012-02-16 [Philo] Changed to CCW
// 0 !HISTORY 2012-03-30 [PTadmin] Official Update 2012-01
// 
// 
// 4 16 9 0 0 8.3151 0 3.4443 7.3912 0 3.0616 8 0 0
  [4,16,9,0,0,8.3151,0,3.4443,7.3912,0,3.0616,8,0,0],
// 4 16 8.3151 0 3.4443 6.3639 0 6.3639 5.6568 0 5.6568 7.3912 0 3.0616
  [4,16,8.3151,0,3.4443,6.3639,0,6.3639,5.6568,0,5.6568,7.3912,0,3.0616],
// 4 16 6.3639 0 6.3639 3.4443 0 8.3151 3.0616 0 7.3912 5.6568 0 5.6568
  [4,16,6.3639,0,6.3639,3.4443,0,8.3151,3.0616,0,7.3912,5.6568,0,5.6568],
// 4 16 3.4443 0 8.3151 0 0 9 0 0 8 3.0616 0 7.3912
  [4,16,3.4443,0,8.3151,0,0,9,0,0,8,3.0616,0,7.3912],
// 4 16 0 0 9 -3.4443 0 8.3151 -3.0616 0 7.3912 0 0 8
  [4,16,0,0,9,-3.4443,0,8.3151,-3.0616,0,7.3912,0,0,8],
// 4 16 -3.4443 0 8.3151 -6.3639 0 6.3639 -5.6568 0 5.6568 -3.0616 0 7.3912
  [4,16,-3.4443,0,8.3151,-6.3639,0,6.3639,-5.6568,0,5.6568,-3.0616,0,7.3912],
// 4 16 -6.3639 0 6.3639 -8.3151 0 3.4443 -7.3912 0 3.0616 -5.6568 0 5.6568
  [4,16,-6.3639,0,6.3639,-8.3151,0,3.4443,-7.3912,0,3.0616,-5.6568,0,5.6568],
// 4 16 -8.3151 0 3.4443 -9 0 0 -8 0 0 -7.3912 0 3.0616
  [4,16,-8.3151,0,3.4443,-9,0,0,-8,0,0,-7.3912,0,3.0616],
// 4 16 -9 0 0 -8.3151 0 -3.4443 -7.3912 0 -3.0616 -8 0 0
  [4,16,-9,0,0,-8.3151,0,-3.4443,-7.3912,0,-3.0616,-8,0,0],
// 4 16 -8.3151 0 -3.4443 -6.3639 0 -6.3639 -5.6568 0 -5.6568 -7.3912 0 -3.0616
  [4,16,-8.3151,0,-3.4443,-6.3639,0,-6.3639,-5.6568,0,-5.6568,-7.3912,0,-3.0616],
// 4 16 -6.3639 0 -6.3639 -3.4443 0 -8.3151 -3.0616 0 -7.3912 -5.6568 0 -5.6568
  [4,16,-6.3639,0,-6.3639,-3.4443,0,-8.3151,-3.0616,0,-7.3912,-5.6568,0,-5.6568],
// 4 16 -3.4443 0 -8.3151 0 0 -9 0 0 -8 -3.0616 0 -7.3912
  [4,16,-3.4443,0,-8.3151,0,0,-9,0,0,-8,-3.0616,0,-7.3912],
// 4 16 0 0 -9 3.4443 0 -8.3151 3.0616 0 -7.3912 0 0 -8
  [4,16,0,0,-9,3.4443,0,-8.3151,3.0616,0,-7.3912,0,0,-8],
// 4 16 3.4443 0 -8.3151 6.3639 0 -6.3639 5.6568 0 -5.6568 3.0616 0 -7.3912
  [4,16,3.4443,0,-8.3151,6.3639,0,-6.3639,5.6568,0,-5.6568,3.0616,0,-7.3912],
// 4 16 6.3639 0 -6.3639 8.3151 0 -3.4443 7.3912 0 -3.0616 5.6568 0 -5.6568
  [4,16,6.3639,0,-6.3639,8.3151,0,-3.4443,7.3912,0,-3.0616,5.6568,0,-5.6568],
// 4 16 8.3151 0 -3.4443 9 0 0 8 0 0 7.3912 0 -3.0616
  [4,16,8.3151,0,-3.4443,9,0,0,8,0,0,7.3912,0,-3.0616],
];
module ldraw_lib__4_4ring8(step=0, col=false, unit=2/5, alt=false, line=0.2, solid=!$preview)
    makepoly(ldraw_lib__4_4ring8(), step=step, col=col, unit=unit, alt=alt, line=line, solid=solid);
ldraw_lib__4_4ring8(line=0.2);
// file: ../p/4-4cylo.scad
use <../lib.scad>
use <4-4cyli.scad>
use <4-4edge.scad>
function ldraw_lib__4_4cylo() = [
// 0 Cylinder Open 1.0
// 0 Name: 4-4cylo.dat
// 0 Author: Mark Kennedy [mkennedy]
// 0 !LDRAW_ORG Primitive UPDATE 2010-01
// 0 !LICENSE Licensed under CC BY 4.0 : see CAreadme.txt
// 
// 0 BFC CERTIFY CCW
  [0,"BFC","CERTIFY"],
  [0,"BFC","CCW"],
// 
// 0 !HISTORY 2010-04-05 [PTadmin] Official Update 2010-01
// 
// 
// 1 16 0 0 0 1 0 0 0 1 0 0 0 1 4-4edge.dat
  [1,16,0,0,0,1,0,0,0,1,0,0,0,1, ldraw_lib__4_4edge()],
// 1 16 0 1 0 1 0 0 0 1 0 0 0 1 4-4edge.dat
  [1,16,0,1,0,1,0,0,0,1,0,0,0,1, ldraw_lib__4_4edge()],
// 1 16 0 0 0 1 0 0 0 1 0 0 0 1 4-4cyli.dat
  [1,16,0,0,0,1,0,0,0,1,0,0,0,1, ldraw_lib__4_4cyli()],
// 0
];
module ldraw_lib__4_4cylo(step=0, col=false, unit=2/5, alt=false, line=0.2, solid=!$preview)
    makepoly(ldraw_lib__4_4cylo(), step=step, col=col, unit=unit, alt=alt, line=line, solid=solid);
ldraw_lib__4_4cylo(line=0.2);
// file: ../p/1-16chrd.scad
use <../lib.scad>
use <empty.scad>
function ldraw_lib__1_16chrd() = [
// 0 Chord 0.0625
// 0 Name: 1-16chrd.dat
// 0 Author: Philippe Hurbain [Philo]
// 0 !LDRAW_ORG Primitive UPDATE 2015-01
// 0 !LICENSE Licensed under CC BY 4.0 : see CAreadme.txt
// 
// 0 BFC CERTIFY CCW
  [0,"BFC","CERTIFY"],
  [0,"BFC","CCW"],
// 
// 0 !HISTORY 2015-10-11 [PTadmin] Official Update 2015-01
// 
// 
// 0 // This file is intentionally empty because at the current \P resolution,
// 0 // an 1-16chrd is actually empty. However, this file still is present
// 0 // to allow tools to do primitives substition and fill in a real chrd here,
// 0 // or, if desired, to substitute this with the hi-res 48\1-16chrd.
// 
// 0 // This file is based on an idea by Darats at http://forums.ldraw.org/read.php?19,14500,14500#msg-14500
// 
// 1 16 0 0 0 1 0 0 0 1 0 0 0 1 empty.dat
  [1,16,0,0,0,1,0,0,0,1,0,0,0,1, ldraw_lib__empty()],
];
module ldraw_lib__1_16chrd(step=0, col=false, unit=2/5, alt=false, line=0.2, solid=!$preview)
    makepoly(ldraw_lib__1_16chrd(), step=step, col=col, unit=unit, alt=alt, line=line, solid=solid);
ldraw_lib__1_16chrd(line=0.2);
// file: s/98138s02.scad
use <../../lib.scad>
use <../../p/4-4cylo.scad>
use <../../p/4-4ring8.scad>
use <../../p/4-4ring9.scad>
use <../../p/stud4o.scad>
function ldraw_lib__s__98138s02() = [
// 0 ~Tile  1 x  1 Round with Groove without Complete Top Face
// 0 Name: s\98138s02.dat
// 0 Author: Magnus Forsberg [MagFors]
// 0 !LDRAW_ORG Subpart UPDATE 2020-01
// 0 !LICENSE Licensed under CC BY 4.0 : see CAreadme.txt
// 
// 0 BFC CERTIFY CCW
  [0,"BFC","CERTIFY"],
  [0,"BFC","CCW"],
// 
// 0 !HISTORY 2020-06-28 [PTadmin] Official Update 2020-01
// 
// 
// 1 16 0 4 0 1 0 0 0 -1 0 0 0 1 stud4o.dat
  [1,16,0,4,0,1,0,0,0,-1,0,0,0,1, ldraw_lib__stud4o()],
// 1 16 0 8 0 -1 0 0 0 -1 0 0 0 1 4-4ring8.dat
  [1,16,0,8,0,-1,0,0,0,-1,0,0,0,1, ldraw_lib__4_4ring8()],
// 1 16 0 7 0 9 0 0 0 1 0 0 0 9 4-4cylo.dat
  [1,16,0,7,0,9,0,0,0,1,0,0,0,9, ldraw_lib__4_4cylo()],
// 1 16 0 7 0 -1 0 0 0 -1 0 0 0 1 4-4ring9.dat
  [1,16,0,7,0,-1,0,0,0,-1,0,0,0,1, ldraw_lib__4_4ring9()],
// 1 16 0 0 0 10 0 0 0 7 0 0 0 10 4-4cylo.dat
  [1,16,0,0,0,10,0,0,0,7,0,0,0,10, ldraw_lib__4_4cylo()],
];
module ldraw_lib__s__98138s02(step=0, col=false, unit=2/5, alt=false, line=0.2, solid=!$preview)
    makepoly(ldraw_lib__s__98138s02(), step=step, col=col, unit=unit, alt=alt, line=line, solid=solid);
ldraw_lib__s__98138s02(line=0.2);
// file: ../p/4-4ering.scad
use <../lib.scad>
use <1-16chrd.scad>
function ldraw_lib__4_4ering() = [
// 0 Adapter Ring Triangles to Normal 1.0
// 0 Name: 4-4ering.dat
// 0 Author: Philippe Hurbain [Philo]
// 0 !LDRAW_ORG Primitive UPDATE 2015-01
// 0 !LICENSE Licensed under CC BY 4.0 : see CAreadme.txt
// 
// 0 BFC CERTIFY CCW
  [0,"BFC","CERTIFY"],
  [0,"BFC","CCW"],
// 
// 0 !HISTORY 2015-10-11 [PTadmin] Official Update 2015-01
// 
// 
// 0 // This file uses 1-16chrd (actually empty). It allows
// 0 // tools to do primitives substition and fill in a ring of chrd here,
// 0 // or, if desired, to substitute this with the hi-res 48\1-16chrd.
// 0 // This file is based on an idea by Darats at http://forums.ldraw.org/read.php?19,14500,14500#msg-14500
// 
// 1 16 0 0 0 1 0 0 0 1 0 0 0 1 1-16chrd.dat
  [1,16,0,0,0,1,0,0,0,1,0,0,0,1, ldraw_lib__1_16chrd()],
// 1 16 0 0 0 0.92388 0 0.38268 0 1 0 -0.38268 0 0.92388 1-16chrd.dat
  [1,16,0,0,0,0.92388,0,0.38268,0,1,0,-0.38268,0,0.92388, ldraw_lib__1_16chrd()],
// 1 16 0 0 0 0.70711 0 0.70711 0 1 0 -0.70711 0 0.70711 1-16chrd.dat
  [1,16,0,0,0,0.70711,0,0.70711,0,1,0,-0.70711,0,0.70711, ldraw_lib__1_16chrd()],
// 1 16 0 0 0 0.38268 0 0.92388 0 1 0 -0.92388 0 0.38268 1-16chrd.dat
  [1,16,0,0,0,0.38268,0,0.92388,0,1,0,-0.92388,0,0.38268, ldraw_lib__1_16chrd()],
// 1 16 0 0 0 0 0 1 0 1 0 -1 0 0 1-16chrd.dat
  [1,16,0,0,0,0,0,1,0,1,0,-1,0,0, ldraw_lib__1_16chrd()],
// 1 16 0 0 0 -0.38268 0 0.92388 0 1 0 -0.92388 0 -0.38268 1-16chrd.dat
  [1,16,0,0,0,-0.38268,0,0.92388,0,1,0,-0.92388,0,-0.38268, ldraw_lib__1_16chrd()],
// 1 16 0 0 0 -0.70711 0 0.70711 0 1 0 -0.70711 0 -0.70711 1-16chrd.dat
  [1,16,0,0,0,-0.70711,0,0.70711,0,1,0,-0.70711,0,-0.70711, ldraw_lib__1_16chrd()],
// 1 16 0 0 0 -0.92388 0 0.38268 0 1 0 -0.38268 0 -0.92388 1-16chrd.dat
  [1,16,0,0,0,-0.92388,0,0.38268,0,1,0,-0.38268,0,-0.92388, ldraw_lib__1_16chrd()],
// 1 16 0 0 0 0 0 -1 0 1 0 1 0 0 1-16chrd.dat
  [1,16,0,0,0,0,0,-1,0,1,0,1,0,0, ldraw_lib__1_16chrd()],
// 1 16 0 0 0 0.38268 0 -0.92388 0 1 0 0.92388 0 0.38268 1-16chrd.dat
  [1,16,0,0,0,0.38268,0,-0.92388,0,1,0,0.92388,0,0.38268, ldraw_lib__1_16chrd()],
// 1 16 0 0 0 0.70711 0 -0.70711 0 1 0 0.70711 0 0.70711 1-16chrd.dat
  [1,16,0,0,0,0.70711,0,-0.70711,0,1,0,0.70711,0,0.70711, ldraw_lib__1_16chrd()],
// 1 16 0 0 0 0.92388 0 -0.38268 0 1 0 0.38268 0 0.92388 1-16chrd.dat
  [1,16,0,0,0,0.92388,0,-0.38268,0,1,0,0.38268,0,0.92388, ldraw_lib__1_16chrd()],
// 1 16 0 0 0 -1 0 0 0 1 0 0 0 -1 1-16chrd.dat
  [1,16,0,0,0,-1,0,0,0,1,0,0,0,-1, ldraw_lib__1_16chrd()],
// 1 16 0 0 0 -0.92388 0 -0.38268 0 1 0 0.38268 0 -0.92388 1-16chrd.dat
  [1,16,0,0,0,-0.92388,0,-0.38268,0,1,0,0.38268,0,-0.92388, ldraw_lib__1_16chrd()],
// 1 16 0 0 0 -0.70711 0 -0.70711 0 1 0 0.70711 0 -0.70711 1-16chrd.dat
  [1,16,0,0,0,-0.70711,0,-0.70711,0,1,0,0.70711,0,-0.70711, ldraw_lib__1_16chrd()],
// 1 16 0 0 0 -0.38268 0 -0.92388 0 1 0 0.92388 0 -0.38268 1-16chrd.dat
  [1,16,0,0,0,-0.38268,0,-0.92388,0,1,0,0.92388,0,-0.38268, ldraw_lib__1_16chrd()],
];
module ldraw_lib__4_4ering(step=0, col=false, unit=2/5, alt=false, line=0.2, solid=!$preview)
    makepoly(ldraw_lib__4_4ering(), step=step, col=col, unit=unit, alt=alt, line=line, solid=solid);
ldraw_lib__4_4ering(line=0.2);
// main file
use <../lib.scad>
use <../p/4-4ering.scad>
use <s/98138p2ts01.scad>
use <s/98138s02.scad>
function ldraw_lib__98138p2t() = [
// 0 Tile  1 x  1 Round with Ladybug with Small White Eyes Pattern
// 0 Name: 98138p2t.dat
// 0 Author: Vincent Messenet [Cheenzo]
// 0 !LDRAW_ORG Part UPDATE 2024-06
// 0 !LICENSE Licensed under CC BY 4.0 : see CAreadme.txt
// 
// 0 BFC CERTIFY CCW
  [0,"BFC","CERTIFY"],
  [0,"BFC","CCW"],
// 
// 0 !KEYWORDS Bricklink 98138pb393, Set 10329, Set 21342
// 
// 0 !HISTORY 2024-07-29 [OrionP] Official Update 2024-06
// 
// 1 16 0 0 0 1 0 0 0 1 0 0 0 1 s\98138s02.dat
  [1,16,0,0,0,1,0,0,0,1,0,0,0,1, ldraw_lib__s__98138s02()],
// 1 16 0 0 0 10 0 0 0 1 0 0 0 10 4-4ering.dat
  [1,16,0,0,0,10,0,0,0,1,0,0,0,10, ldraw_lib__4_4ering()],
// 1 16 0 0 0 1 0 0 0 1 0 0 0 1 s\98138p2ts01.dat
  [1,16,0,0,0,1,0,0,0,1,0,0,0,1, ldraw_lib__s__98138p2ts01()],
// 1 16 0 0 0 -1 0 0 0 1 0 0 0 1 s\98138p2ts01.dat
  [1,16,0,0,0,-1,0,0,0,1,0,0,0,1, ldraw_lib__s__98138p2ts01()],
// 3 16 0 0 10 -.4 0 9.32 .4 0 9.32
  [3,16,0,0,10,-.4,0,9.32,.4,0,9.32],
// 3 16 0 0 -10 1.1 0 -9.28 -1.1 0 -9.28
  [3,16,0,0,-10,1.1,0,-9.28,-1.1,0,-9.28],
// 4 320 -.4 0 -.22 -.11 0 -.44 .11 0 -.44 .4 0 -.22
  [4,320,-.4,0,-.22,-.11,0,-.44,.11,0,-.44,.4,0,-.22],
// 4 320 -.4 0 -.22 .4 0 -.22 .4 0 9.32 -.4 0 9.32
  [4,320,-.4,0,-.22,.4,0,-.22,.4,0,9.32,-.4,0,9.32],
// 4 0 .88 0 -3.43 .11 0 -.44 -.11 0 -.44 -.88 0 -3.43
  [4,0,.88,0,-3.43,.11,0,-.44,-.11,0,-.44,-.88,0,-3.43],
// 4 0 .58 0 -3.73 .88 0 -3.43 -.88 0 -3.43 -.58 0 -3.73
  [4,0,.58,0,-3.73,.88,0,-3.43,-.88,0,-3.43,-.58,0,-3.73],
// 4 0 1.79 0 -6.54 .58 0 -3.73 -.58 0 -3.73 -1.79 0 -6.54
  [4,0,1.79,0,-6.54,.58,0,-3.73,-.58,0,-3.73,-1.79,0,-6.54],
// 4 0 1.57 0 -7.02 1.79 0 -6.54 -1.79 0 -6.54 -1.57 0 -7.02
  [4,0,1.57,0,-7.02,1.79,0,-6.54,-1.79,0,-6.54,-1.57,0,-7.02],
// 4 0 1.53 0 -7.27 1.57 0 -7.02 -1.57 0 -7.02 -1.53 0 -7.27
  [4,0,1.53,0,-7.27,1.57,0,-7.02,-1.57,0,-7.02,-1.53,0,-7.27],
// 4 0 -1.1 0 -9.28 1.1 0 -9.28 1.53 0 -7.27 -1.53 0 -7.27
  [4,0,-1.1,0,-9.28,1.1,0,-9.28,1.53,0,-7.27,-1.53,0,-7.27],
];
module ldraw_lib__98138p2t(step=0, col=false, unit=2/5, alt=false, line=0.2, solid=!$preview)
    makepoly(ldraw_lib__98138p2t(), step=step, col=col, unit=unit, alt=alt, line=line, solid=solid);
ldraw_lib__98138p2t(line=0.2);
